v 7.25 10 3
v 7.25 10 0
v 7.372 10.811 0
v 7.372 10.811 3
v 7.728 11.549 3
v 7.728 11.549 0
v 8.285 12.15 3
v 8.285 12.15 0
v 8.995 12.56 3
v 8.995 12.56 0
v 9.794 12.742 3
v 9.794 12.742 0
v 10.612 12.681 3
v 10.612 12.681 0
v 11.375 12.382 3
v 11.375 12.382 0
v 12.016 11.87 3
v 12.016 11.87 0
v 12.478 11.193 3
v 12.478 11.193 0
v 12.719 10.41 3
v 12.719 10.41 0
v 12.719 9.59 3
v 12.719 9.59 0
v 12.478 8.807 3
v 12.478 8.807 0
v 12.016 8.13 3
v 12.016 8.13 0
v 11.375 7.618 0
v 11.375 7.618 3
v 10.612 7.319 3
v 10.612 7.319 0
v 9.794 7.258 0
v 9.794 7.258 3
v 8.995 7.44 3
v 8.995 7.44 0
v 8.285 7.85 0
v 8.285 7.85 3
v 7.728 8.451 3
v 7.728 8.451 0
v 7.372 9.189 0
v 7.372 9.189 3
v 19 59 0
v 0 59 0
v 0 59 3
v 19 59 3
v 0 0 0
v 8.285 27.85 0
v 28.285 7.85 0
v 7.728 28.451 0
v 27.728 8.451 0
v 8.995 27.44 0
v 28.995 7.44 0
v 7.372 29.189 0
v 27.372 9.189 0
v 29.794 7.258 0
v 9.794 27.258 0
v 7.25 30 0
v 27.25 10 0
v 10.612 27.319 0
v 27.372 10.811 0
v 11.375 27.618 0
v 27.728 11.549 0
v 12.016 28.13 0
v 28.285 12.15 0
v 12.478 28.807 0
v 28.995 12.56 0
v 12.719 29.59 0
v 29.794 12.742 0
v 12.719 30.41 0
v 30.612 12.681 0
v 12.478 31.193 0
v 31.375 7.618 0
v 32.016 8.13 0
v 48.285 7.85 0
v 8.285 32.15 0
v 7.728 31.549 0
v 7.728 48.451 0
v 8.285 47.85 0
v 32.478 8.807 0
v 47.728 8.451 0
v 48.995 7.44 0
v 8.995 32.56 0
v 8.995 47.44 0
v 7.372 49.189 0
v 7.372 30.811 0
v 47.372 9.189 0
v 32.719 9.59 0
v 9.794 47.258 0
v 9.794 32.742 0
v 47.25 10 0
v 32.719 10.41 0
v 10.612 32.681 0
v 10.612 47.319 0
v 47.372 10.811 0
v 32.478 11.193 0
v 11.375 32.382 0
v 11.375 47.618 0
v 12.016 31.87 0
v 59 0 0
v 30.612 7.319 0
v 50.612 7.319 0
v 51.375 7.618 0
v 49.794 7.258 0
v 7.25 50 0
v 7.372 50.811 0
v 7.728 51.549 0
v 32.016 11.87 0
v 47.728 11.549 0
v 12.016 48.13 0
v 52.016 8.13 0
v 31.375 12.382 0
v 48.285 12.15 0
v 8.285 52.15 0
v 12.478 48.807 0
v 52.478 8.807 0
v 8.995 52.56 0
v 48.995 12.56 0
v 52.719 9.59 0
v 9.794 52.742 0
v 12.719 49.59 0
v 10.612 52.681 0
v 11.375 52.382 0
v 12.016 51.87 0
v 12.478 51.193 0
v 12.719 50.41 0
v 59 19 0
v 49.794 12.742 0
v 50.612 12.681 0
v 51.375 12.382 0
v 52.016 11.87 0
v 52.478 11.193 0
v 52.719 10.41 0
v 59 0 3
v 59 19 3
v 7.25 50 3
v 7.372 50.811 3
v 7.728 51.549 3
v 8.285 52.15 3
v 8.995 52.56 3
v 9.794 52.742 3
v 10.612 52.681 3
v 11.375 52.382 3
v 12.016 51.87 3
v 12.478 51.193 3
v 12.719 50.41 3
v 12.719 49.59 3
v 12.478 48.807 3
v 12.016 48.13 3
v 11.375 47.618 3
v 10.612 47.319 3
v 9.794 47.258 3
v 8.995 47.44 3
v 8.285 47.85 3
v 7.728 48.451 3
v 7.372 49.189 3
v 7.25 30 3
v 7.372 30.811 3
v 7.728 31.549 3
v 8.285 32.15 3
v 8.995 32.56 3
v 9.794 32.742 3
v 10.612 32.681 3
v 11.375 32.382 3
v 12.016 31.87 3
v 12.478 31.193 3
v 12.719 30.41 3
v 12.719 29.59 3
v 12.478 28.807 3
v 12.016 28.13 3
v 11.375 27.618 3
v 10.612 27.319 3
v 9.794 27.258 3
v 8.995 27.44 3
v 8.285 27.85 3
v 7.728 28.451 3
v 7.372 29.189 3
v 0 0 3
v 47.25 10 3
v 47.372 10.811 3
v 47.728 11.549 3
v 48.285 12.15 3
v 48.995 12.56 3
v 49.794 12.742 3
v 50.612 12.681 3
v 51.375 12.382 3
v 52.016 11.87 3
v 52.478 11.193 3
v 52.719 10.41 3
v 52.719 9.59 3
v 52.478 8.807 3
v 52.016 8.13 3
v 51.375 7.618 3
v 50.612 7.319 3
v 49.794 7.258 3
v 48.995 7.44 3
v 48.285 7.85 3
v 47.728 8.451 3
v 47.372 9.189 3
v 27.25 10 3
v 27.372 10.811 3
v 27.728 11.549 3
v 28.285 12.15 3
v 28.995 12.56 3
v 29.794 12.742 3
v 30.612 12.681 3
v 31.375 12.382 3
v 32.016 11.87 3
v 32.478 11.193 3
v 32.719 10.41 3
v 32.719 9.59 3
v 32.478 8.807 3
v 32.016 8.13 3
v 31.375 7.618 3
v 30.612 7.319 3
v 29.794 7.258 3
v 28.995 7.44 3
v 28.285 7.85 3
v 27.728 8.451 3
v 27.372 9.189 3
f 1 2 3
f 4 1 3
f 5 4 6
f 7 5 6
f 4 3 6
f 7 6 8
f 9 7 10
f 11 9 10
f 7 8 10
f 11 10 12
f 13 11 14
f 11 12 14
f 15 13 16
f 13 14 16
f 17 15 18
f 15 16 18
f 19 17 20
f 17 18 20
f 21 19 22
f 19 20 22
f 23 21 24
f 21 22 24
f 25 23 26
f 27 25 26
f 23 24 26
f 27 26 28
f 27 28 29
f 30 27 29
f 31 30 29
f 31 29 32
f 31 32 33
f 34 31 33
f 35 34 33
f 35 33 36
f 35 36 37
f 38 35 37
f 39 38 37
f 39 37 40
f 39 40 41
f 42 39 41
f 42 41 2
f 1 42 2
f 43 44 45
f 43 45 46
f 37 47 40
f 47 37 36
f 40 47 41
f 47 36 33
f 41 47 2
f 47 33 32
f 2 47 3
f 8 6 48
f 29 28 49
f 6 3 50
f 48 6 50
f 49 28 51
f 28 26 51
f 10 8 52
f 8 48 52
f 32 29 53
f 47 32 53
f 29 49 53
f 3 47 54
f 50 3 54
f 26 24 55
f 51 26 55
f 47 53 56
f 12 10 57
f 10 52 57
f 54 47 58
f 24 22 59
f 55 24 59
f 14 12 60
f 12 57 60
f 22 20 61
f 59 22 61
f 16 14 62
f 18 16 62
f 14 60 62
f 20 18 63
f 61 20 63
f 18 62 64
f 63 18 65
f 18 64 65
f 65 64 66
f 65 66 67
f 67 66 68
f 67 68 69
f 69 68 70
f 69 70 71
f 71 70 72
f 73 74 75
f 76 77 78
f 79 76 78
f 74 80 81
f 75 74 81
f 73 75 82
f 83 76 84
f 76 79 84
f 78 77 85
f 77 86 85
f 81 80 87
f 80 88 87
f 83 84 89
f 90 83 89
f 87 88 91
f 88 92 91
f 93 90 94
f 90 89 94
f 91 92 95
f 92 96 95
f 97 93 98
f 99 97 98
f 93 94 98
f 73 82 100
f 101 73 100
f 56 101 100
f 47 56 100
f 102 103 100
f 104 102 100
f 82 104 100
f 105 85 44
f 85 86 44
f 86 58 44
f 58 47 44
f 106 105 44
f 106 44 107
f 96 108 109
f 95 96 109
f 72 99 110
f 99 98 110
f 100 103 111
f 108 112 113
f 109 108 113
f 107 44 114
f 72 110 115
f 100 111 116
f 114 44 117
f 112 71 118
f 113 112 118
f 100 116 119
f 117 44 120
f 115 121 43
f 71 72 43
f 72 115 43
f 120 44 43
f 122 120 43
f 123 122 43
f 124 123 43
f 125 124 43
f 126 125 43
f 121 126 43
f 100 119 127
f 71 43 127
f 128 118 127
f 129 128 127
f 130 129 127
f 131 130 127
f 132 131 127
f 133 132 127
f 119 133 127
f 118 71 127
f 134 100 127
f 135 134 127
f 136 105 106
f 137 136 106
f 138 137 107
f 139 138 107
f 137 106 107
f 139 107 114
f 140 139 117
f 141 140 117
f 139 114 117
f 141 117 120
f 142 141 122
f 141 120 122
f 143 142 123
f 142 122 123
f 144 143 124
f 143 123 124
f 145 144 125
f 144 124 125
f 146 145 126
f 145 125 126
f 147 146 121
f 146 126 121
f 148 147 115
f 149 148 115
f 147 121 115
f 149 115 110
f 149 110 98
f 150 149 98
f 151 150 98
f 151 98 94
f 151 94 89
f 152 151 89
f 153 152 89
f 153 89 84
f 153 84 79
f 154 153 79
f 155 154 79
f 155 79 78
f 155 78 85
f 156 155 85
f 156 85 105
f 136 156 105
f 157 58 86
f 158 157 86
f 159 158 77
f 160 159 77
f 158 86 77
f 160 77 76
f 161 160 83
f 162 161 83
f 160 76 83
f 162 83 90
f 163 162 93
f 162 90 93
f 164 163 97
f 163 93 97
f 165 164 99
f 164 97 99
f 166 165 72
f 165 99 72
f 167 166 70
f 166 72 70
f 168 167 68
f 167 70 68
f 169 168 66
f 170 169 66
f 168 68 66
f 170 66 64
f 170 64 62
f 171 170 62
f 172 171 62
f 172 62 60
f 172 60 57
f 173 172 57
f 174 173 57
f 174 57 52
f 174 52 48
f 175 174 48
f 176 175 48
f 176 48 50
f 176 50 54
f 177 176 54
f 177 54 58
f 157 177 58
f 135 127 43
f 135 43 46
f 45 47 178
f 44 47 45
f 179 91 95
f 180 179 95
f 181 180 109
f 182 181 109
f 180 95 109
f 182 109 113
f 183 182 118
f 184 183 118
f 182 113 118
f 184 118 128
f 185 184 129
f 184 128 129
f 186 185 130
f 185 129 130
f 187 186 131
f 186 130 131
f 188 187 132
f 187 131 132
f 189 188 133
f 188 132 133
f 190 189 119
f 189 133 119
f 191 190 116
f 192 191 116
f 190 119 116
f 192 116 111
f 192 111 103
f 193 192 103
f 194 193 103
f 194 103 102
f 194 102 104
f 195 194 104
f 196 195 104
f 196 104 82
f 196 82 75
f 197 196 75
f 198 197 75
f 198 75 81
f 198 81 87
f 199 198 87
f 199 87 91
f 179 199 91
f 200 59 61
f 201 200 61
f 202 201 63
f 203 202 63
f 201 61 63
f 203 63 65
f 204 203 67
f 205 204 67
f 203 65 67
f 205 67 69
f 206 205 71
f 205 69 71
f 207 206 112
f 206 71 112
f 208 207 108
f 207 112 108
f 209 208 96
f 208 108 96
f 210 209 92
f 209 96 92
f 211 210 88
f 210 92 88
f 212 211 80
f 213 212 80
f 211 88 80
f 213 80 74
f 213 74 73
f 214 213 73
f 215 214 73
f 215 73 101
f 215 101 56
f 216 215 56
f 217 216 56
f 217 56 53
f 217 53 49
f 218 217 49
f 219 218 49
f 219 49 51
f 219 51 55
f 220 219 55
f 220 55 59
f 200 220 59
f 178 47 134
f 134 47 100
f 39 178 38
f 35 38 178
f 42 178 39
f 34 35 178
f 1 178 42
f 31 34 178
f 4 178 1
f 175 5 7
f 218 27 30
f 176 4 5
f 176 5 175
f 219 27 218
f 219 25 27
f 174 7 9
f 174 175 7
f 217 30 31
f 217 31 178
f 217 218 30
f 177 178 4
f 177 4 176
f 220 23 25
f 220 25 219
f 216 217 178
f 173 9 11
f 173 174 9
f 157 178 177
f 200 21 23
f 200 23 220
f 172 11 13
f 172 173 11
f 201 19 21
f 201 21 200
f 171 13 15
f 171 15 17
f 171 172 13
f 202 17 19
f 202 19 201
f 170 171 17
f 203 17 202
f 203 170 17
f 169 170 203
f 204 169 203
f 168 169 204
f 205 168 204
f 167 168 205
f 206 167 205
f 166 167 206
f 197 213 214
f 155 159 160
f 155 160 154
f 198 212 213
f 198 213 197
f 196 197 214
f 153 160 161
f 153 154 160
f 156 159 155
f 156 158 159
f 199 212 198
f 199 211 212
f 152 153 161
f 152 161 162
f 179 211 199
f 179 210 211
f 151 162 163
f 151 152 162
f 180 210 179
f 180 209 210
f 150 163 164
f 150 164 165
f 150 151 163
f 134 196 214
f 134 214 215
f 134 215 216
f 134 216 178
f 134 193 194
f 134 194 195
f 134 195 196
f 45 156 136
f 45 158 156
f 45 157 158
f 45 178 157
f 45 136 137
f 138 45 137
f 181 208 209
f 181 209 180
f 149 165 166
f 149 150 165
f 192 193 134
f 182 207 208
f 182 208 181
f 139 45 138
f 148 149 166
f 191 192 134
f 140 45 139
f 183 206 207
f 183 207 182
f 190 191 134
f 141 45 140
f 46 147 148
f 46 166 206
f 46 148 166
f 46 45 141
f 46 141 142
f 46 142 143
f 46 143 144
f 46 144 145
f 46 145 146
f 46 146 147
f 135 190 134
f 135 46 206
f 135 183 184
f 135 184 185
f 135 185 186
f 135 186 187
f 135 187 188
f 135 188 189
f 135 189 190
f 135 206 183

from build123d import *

# Parameters (mm, degrees)
SCHIZZO1_W                   = 59
SCHIZZO1_H                   = 59
ESTRUSIONE_ESTRUSIONE1_DEPTH = 3
FORO_PER_VITE_M5_1_D         = 5.5
SMUSSO1_SIZE                 = 40


with BuildPart() as part:
    # Schizzo1 → Estrusione-Estrusione1 (new body)
    with BuildSketch(Plane.XY):
        with Locations((29.5, 29.5)):
            Rectangle(SCHIZZO1_W, SCHIZZO1_H)
    extrude(amount=ESTRUSIONE_ESTRUSIONE1_DEPTH)

    # Foro per Vite M5-1 (through all)
    with Locations(Plane.XY.offset(3)):
        with Locations((10, 10), (10, 30), (30, 10), (50, 10), (10, 50)):
            Hole(FORO_PER_VITE_M5_1_D / 2)

    # Smusso1
    smusso1_edges = [part.edges().sort_by_distance(p)[0] for p in [
        (59, 59, 1.5),
    ]]
    chamfer(smusso1_edges, length=SMUSSO1_SIZE)


solid = part.part
